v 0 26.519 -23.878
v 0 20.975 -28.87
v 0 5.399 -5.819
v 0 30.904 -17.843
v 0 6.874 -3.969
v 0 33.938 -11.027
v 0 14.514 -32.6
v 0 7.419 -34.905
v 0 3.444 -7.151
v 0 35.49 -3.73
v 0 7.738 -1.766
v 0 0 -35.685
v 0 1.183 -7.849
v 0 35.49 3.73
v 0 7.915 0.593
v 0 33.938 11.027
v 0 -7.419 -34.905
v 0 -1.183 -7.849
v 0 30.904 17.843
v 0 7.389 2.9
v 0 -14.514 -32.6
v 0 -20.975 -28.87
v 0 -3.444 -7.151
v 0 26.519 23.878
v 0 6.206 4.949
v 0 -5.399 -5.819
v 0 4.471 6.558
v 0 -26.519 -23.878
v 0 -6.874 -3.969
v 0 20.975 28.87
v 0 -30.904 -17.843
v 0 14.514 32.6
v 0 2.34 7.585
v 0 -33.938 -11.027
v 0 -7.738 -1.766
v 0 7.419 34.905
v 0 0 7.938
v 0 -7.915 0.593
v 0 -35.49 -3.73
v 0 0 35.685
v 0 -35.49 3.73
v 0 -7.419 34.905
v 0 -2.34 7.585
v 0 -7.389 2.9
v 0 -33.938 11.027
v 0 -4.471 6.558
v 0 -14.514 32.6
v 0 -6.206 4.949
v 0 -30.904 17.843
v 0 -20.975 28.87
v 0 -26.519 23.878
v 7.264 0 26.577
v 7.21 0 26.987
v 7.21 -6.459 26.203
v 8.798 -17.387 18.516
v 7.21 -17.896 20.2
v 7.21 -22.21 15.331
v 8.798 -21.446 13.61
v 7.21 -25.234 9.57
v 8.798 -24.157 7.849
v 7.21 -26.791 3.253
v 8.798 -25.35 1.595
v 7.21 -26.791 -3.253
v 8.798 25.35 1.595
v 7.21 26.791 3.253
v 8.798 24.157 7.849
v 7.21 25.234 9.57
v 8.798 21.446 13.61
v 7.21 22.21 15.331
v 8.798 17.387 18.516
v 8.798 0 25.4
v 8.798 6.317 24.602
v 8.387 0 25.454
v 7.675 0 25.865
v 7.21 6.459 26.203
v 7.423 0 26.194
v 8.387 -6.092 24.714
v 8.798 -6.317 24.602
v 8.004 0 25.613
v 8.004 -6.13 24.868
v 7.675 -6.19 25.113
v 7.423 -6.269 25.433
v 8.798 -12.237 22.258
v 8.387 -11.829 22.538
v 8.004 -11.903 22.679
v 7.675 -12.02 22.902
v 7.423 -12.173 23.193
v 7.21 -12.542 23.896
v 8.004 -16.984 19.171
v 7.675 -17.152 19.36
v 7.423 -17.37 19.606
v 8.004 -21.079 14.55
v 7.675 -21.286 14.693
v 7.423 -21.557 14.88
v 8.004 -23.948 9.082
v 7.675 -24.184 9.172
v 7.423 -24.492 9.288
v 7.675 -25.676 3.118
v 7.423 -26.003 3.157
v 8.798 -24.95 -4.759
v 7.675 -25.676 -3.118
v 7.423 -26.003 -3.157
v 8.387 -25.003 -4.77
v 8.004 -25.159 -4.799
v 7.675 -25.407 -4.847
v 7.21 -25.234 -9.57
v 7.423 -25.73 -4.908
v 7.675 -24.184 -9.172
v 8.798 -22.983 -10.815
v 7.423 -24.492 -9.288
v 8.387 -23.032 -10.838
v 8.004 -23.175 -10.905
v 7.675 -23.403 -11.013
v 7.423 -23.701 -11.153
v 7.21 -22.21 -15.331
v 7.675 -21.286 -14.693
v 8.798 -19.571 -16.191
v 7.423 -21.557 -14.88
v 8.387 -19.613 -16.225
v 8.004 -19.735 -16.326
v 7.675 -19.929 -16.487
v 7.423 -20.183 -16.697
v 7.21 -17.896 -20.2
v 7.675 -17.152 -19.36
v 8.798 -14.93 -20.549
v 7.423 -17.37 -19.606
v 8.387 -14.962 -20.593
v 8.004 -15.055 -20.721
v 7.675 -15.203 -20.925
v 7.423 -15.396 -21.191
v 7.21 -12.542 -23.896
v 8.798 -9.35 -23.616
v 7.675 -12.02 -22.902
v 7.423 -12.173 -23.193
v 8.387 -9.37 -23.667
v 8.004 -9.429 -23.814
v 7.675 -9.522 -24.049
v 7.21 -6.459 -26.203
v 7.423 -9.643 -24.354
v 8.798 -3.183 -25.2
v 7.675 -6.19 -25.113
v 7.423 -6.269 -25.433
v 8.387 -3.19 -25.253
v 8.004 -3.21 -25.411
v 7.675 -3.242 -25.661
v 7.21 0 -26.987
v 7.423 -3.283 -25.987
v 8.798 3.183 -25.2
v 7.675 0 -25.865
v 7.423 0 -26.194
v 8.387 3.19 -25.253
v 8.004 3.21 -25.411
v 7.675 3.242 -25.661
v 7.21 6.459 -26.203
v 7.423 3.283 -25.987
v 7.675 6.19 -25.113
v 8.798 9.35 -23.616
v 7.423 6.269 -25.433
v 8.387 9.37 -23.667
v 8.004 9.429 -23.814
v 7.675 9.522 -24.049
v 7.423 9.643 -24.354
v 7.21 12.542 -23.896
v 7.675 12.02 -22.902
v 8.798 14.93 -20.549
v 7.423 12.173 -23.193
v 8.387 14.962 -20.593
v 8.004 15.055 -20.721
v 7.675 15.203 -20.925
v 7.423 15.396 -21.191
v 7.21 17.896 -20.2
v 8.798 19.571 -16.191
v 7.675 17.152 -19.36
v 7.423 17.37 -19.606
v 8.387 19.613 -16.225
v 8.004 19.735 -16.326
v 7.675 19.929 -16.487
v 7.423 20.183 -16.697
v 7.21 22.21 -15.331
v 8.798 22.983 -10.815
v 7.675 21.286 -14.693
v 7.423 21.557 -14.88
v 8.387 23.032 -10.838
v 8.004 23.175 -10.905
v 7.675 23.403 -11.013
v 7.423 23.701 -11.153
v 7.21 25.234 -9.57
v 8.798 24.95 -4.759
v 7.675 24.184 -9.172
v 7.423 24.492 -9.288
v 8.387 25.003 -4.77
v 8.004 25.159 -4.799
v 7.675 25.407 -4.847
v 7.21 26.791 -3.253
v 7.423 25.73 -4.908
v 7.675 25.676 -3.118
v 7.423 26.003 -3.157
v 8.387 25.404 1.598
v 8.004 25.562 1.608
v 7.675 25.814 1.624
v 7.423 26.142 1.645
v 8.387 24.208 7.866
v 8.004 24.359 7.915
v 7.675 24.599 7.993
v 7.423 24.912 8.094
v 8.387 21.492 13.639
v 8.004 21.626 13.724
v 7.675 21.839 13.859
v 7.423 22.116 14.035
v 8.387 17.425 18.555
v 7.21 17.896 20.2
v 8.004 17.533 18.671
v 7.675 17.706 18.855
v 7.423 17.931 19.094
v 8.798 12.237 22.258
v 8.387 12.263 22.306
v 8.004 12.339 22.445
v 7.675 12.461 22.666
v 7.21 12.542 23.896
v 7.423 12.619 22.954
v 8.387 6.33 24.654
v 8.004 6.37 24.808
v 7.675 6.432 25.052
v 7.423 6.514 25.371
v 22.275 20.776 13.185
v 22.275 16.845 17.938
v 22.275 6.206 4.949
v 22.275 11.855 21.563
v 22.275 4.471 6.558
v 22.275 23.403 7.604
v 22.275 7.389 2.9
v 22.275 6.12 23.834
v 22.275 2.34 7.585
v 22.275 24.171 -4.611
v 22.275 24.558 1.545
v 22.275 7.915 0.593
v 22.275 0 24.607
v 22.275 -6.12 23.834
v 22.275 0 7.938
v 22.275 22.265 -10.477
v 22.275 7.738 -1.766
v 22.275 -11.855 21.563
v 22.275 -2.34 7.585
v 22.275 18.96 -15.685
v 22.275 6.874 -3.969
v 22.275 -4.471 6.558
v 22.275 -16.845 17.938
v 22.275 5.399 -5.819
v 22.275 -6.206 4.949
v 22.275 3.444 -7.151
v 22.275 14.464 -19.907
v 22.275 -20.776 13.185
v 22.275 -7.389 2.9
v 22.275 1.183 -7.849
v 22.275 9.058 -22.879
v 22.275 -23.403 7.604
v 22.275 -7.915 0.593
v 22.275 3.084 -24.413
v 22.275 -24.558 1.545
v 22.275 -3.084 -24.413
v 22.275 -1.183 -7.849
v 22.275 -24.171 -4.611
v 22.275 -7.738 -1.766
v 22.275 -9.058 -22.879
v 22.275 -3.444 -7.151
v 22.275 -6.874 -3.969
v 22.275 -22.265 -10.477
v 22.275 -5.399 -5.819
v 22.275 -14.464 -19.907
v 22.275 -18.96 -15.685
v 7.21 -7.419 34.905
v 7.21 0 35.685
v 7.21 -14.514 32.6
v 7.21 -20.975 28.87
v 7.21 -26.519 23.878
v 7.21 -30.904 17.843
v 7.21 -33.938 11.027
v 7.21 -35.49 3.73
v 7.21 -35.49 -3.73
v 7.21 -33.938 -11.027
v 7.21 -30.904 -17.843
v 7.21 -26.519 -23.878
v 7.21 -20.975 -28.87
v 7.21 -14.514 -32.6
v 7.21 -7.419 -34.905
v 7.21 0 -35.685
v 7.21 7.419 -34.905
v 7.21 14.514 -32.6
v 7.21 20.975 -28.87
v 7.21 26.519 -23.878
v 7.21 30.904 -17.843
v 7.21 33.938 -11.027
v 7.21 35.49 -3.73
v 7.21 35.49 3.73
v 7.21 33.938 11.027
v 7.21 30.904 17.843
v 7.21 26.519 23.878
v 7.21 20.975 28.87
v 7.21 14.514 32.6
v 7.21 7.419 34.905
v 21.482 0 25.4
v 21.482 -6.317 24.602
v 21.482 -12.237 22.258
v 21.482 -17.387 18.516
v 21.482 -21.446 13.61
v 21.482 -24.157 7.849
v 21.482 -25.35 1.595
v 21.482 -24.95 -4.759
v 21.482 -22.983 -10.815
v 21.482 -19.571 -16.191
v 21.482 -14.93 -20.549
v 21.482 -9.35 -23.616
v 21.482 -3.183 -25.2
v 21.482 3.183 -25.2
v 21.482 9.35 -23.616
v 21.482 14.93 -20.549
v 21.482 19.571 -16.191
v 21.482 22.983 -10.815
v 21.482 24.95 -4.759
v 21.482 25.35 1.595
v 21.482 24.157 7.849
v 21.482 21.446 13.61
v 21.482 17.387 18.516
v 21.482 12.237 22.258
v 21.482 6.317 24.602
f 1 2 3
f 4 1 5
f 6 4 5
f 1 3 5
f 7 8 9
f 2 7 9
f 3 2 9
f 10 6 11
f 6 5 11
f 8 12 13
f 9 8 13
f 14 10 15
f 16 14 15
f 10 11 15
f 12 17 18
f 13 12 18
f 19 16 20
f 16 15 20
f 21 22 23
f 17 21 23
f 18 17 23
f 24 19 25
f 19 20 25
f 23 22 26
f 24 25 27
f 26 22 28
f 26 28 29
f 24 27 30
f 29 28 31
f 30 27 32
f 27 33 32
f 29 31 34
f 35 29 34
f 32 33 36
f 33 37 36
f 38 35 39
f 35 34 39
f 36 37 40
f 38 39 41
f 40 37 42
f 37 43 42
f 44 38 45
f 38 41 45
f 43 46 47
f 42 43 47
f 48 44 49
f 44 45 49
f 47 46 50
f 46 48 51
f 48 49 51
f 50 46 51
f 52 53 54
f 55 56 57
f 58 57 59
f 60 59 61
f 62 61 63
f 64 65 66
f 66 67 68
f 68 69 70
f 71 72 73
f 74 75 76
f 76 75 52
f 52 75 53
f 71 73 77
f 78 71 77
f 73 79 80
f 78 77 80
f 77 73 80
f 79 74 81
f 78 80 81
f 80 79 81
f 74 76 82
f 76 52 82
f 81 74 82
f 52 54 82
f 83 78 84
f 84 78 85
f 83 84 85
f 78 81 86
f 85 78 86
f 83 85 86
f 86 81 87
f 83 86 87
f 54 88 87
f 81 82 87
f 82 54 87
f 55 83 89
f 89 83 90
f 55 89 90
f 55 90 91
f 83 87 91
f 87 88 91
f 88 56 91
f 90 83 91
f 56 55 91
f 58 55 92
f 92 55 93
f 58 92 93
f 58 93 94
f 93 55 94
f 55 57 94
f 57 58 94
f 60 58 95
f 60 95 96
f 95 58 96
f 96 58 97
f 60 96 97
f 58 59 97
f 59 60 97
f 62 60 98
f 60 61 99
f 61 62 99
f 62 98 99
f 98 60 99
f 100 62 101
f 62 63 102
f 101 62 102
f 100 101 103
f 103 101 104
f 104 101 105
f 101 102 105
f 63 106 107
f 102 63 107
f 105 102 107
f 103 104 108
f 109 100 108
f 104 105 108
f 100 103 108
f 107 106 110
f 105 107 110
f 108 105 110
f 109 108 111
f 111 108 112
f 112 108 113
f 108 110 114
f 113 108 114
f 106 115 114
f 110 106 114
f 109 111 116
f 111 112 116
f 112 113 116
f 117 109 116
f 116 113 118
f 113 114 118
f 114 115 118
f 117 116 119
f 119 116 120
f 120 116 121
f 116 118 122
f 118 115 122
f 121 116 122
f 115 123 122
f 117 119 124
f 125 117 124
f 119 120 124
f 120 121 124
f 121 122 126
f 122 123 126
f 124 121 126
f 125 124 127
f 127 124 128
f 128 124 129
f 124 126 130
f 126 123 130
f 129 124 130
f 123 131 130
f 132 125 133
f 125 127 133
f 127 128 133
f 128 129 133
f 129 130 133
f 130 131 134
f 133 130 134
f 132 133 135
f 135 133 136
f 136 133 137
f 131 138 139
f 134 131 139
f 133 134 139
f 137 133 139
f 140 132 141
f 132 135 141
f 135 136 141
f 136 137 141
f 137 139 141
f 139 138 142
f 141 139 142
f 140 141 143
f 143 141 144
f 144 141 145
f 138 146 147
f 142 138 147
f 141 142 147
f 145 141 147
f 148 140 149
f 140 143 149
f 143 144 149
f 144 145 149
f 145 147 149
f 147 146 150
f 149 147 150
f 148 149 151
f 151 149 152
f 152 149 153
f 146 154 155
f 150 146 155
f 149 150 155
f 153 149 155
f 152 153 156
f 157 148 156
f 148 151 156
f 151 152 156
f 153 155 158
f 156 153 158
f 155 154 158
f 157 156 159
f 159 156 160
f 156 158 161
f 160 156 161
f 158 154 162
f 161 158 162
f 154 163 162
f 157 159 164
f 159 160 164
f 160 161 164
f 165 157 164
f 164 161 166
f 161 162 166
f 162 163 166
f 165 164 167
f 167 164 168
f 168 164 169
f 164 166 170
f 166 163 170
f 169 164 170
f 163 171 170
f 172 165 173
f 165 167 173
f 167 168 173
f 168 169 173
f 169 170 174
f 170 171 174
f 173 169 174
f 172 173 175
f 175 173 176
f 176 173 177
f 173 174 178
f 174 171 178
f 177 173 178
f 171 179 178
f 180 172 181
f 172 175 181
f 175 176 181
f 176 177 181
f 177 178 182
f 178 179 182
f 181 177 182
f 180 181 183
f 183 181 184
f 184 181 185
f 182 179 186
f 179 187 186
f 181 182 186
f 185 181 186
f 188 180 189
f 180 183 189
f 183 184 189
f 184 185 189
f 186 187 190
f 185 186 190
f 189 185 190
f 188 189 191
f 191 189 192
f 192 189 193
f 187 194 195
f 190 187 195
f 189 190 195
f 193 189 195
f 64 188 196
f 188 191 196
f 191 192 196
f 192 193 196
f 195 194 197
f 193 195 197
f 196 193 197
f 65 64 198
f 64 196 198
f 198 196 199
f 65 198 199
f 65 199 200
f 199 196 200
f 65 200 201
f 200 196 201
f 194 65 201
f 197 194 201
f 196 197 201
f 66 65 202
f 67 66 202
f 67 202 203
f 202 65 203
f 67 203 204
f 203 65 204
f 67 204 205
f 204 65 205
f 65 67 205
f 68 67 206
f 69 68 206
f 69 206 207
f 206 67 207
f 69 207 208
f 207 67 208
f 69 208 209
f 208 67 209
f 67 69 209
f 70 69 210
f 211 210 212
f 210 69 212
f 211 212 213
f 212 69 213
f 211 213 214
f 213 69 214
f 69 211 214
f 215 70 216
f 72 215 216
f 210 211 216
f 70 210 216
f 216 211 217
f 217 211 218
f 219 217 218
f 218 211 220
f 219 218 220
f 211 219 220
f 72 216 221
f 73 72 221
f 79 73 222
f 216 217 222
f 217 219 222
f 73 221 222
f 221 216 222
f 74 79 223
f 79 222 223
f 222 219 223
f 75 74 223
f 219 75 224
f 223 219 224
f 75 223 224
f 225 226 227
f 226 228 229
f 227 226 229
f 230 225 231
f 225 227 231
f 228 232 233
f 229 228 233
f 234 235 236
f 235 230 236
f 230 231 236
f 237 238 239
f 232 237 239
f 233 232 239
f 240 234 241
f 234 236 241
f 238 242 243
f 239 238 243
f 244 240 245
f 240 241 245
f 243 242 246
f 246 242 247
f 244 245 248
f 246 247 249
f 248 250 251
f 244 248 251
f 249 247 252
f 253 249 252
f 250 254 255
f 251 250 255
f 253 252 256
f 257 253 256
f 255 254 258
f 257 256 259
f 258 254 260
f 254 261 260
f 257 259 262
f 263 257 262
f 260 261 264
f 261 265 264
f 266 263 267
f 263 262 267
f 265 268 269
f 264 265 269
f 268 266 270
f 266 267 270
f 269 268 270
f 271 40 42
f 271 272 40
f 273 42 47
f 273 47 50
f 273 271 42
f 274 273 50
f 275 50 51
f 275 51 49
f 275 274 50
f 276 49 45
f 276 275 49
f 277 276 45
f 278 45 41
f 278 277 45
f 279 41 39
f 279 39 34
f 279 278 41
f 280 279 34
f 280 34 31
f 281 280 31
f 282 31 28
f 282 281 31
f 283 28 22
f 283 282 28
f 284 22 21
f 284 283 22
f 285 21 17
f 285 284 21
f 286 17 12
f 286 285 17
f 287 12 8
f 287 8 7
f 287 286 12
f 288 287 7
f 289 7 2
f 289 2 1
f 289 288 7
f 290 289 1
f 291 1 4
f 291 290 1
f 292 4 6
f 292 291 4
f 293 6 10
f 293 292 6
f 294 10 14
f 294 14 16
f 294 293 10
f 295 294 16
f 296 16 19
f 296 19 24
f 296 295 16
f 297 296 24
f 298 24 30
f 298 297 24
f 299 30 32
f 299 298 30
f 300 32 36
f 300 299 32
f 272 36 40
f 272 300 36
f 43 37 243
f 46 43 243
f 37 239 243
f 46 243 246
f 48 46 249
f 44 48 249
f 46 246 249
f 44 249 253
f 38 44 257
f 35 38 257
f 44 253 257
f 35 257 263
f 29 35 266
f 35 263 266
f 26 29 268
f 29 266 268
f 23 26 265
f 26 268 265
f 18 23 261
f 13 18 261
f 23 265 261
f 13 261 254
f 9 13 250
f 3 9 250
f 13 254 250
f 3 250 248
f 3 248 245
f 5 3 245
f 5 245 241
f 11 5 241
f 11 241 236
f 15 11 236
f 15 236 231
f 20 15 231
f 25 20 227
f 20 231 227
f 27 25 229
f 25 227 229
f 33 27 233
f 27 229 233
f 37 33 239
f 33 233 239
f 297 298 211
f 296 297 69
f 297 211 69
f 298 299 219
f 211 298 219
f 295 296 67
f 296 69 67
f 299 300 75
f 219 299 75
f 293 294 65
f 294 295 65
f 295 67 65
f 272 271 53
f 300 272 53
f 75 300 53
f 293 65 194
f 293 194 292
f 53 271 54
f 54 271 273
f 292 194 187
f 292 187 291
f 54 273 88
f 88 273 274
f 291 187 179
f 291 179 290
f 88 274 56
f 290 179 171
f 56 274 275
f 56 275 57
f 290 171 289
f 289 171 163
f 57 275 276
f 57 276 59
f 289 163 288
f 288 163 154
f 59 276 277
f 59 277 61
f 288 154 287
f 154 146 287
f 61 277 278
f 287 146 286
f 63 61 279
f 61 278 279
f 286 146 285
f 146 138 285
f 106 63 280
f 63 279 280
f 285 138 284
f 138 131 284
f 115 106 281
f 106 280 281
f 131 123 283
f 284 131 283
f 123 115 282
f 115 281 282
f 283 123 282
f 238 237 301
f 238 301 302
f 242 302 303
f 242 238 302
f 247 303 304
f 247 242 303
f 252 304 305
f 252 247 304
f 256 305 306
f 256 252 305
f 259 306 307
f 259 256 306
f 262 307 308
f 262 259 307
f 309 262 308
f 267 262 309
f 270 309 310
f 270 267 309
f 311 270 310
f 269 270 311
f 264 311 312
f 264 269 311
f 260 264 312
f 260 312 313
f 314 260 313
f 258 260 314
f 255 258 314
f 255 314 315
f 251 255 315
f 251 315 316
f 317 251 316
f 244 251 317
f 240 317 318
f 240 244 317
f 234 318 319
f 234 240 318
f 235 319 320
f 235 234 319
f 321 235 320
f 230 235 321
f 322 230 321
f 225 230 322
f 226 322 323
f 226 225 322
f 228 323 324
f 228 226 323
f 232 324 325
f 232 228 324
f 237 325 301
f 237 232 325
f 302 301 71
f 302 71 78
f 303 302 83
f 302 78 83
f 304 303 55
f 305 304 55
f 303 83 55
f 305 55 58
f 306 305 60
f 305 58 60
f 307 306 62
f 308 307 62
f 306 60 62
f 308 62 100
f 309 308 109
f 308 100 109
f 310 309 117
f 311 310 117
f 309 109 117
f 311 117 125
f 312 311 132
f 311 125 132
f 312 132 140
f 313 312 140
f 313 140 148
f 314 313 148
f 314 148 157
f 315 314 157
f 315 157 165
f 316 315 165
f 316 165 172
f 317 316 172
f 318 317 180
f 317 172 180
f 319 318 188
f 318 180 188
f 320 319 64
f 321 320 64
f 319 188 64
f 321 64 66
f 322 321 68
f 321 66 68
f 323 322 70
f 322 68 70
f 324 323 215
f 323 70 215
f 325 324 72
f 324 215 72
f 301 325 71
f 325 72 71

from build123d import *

# Parameters (mm, degrees)
F0_W    = 15.065
F0_H    = 17.4625
F0_W_2  = 7.21
F0_H_2  = 10.285
F2_R    = 1.5875
F3_SIZE = 0.793


with BuildPart() as f1:
    # F0 (on Front) → F1 (revolve)
    with BuildSketch(Plane.XZ):
        with Locations((14.7425, 16.66875)):
            Rectangle(F0_W, F0_H)
        with Locations((3.605, 16.66875)):
            Rectangle(F0_W_2, F0_H)
        with Locations((3.605, 30.5425)):
            Rectangle(F0_W_2, F0_H_2)
    revolve(axis=Axis((11.1375, 0, 0), (1, 0, 0)))

    # F2
    f2_edges = [f1.edges().sort_by_distance(p)[0] for p in [
        (7.21, 0, -25.4),
    ]]
    fillet(f2_edges, radius=F2_R)

    # F3
    f3_edges = [f1.edges().sort_by_distance(p)[0] for p in [
        (22.275, 0, -25.4),
    ]]
    chamfer(f3_edges, length=F3_SIZE)


solid = f1.part
